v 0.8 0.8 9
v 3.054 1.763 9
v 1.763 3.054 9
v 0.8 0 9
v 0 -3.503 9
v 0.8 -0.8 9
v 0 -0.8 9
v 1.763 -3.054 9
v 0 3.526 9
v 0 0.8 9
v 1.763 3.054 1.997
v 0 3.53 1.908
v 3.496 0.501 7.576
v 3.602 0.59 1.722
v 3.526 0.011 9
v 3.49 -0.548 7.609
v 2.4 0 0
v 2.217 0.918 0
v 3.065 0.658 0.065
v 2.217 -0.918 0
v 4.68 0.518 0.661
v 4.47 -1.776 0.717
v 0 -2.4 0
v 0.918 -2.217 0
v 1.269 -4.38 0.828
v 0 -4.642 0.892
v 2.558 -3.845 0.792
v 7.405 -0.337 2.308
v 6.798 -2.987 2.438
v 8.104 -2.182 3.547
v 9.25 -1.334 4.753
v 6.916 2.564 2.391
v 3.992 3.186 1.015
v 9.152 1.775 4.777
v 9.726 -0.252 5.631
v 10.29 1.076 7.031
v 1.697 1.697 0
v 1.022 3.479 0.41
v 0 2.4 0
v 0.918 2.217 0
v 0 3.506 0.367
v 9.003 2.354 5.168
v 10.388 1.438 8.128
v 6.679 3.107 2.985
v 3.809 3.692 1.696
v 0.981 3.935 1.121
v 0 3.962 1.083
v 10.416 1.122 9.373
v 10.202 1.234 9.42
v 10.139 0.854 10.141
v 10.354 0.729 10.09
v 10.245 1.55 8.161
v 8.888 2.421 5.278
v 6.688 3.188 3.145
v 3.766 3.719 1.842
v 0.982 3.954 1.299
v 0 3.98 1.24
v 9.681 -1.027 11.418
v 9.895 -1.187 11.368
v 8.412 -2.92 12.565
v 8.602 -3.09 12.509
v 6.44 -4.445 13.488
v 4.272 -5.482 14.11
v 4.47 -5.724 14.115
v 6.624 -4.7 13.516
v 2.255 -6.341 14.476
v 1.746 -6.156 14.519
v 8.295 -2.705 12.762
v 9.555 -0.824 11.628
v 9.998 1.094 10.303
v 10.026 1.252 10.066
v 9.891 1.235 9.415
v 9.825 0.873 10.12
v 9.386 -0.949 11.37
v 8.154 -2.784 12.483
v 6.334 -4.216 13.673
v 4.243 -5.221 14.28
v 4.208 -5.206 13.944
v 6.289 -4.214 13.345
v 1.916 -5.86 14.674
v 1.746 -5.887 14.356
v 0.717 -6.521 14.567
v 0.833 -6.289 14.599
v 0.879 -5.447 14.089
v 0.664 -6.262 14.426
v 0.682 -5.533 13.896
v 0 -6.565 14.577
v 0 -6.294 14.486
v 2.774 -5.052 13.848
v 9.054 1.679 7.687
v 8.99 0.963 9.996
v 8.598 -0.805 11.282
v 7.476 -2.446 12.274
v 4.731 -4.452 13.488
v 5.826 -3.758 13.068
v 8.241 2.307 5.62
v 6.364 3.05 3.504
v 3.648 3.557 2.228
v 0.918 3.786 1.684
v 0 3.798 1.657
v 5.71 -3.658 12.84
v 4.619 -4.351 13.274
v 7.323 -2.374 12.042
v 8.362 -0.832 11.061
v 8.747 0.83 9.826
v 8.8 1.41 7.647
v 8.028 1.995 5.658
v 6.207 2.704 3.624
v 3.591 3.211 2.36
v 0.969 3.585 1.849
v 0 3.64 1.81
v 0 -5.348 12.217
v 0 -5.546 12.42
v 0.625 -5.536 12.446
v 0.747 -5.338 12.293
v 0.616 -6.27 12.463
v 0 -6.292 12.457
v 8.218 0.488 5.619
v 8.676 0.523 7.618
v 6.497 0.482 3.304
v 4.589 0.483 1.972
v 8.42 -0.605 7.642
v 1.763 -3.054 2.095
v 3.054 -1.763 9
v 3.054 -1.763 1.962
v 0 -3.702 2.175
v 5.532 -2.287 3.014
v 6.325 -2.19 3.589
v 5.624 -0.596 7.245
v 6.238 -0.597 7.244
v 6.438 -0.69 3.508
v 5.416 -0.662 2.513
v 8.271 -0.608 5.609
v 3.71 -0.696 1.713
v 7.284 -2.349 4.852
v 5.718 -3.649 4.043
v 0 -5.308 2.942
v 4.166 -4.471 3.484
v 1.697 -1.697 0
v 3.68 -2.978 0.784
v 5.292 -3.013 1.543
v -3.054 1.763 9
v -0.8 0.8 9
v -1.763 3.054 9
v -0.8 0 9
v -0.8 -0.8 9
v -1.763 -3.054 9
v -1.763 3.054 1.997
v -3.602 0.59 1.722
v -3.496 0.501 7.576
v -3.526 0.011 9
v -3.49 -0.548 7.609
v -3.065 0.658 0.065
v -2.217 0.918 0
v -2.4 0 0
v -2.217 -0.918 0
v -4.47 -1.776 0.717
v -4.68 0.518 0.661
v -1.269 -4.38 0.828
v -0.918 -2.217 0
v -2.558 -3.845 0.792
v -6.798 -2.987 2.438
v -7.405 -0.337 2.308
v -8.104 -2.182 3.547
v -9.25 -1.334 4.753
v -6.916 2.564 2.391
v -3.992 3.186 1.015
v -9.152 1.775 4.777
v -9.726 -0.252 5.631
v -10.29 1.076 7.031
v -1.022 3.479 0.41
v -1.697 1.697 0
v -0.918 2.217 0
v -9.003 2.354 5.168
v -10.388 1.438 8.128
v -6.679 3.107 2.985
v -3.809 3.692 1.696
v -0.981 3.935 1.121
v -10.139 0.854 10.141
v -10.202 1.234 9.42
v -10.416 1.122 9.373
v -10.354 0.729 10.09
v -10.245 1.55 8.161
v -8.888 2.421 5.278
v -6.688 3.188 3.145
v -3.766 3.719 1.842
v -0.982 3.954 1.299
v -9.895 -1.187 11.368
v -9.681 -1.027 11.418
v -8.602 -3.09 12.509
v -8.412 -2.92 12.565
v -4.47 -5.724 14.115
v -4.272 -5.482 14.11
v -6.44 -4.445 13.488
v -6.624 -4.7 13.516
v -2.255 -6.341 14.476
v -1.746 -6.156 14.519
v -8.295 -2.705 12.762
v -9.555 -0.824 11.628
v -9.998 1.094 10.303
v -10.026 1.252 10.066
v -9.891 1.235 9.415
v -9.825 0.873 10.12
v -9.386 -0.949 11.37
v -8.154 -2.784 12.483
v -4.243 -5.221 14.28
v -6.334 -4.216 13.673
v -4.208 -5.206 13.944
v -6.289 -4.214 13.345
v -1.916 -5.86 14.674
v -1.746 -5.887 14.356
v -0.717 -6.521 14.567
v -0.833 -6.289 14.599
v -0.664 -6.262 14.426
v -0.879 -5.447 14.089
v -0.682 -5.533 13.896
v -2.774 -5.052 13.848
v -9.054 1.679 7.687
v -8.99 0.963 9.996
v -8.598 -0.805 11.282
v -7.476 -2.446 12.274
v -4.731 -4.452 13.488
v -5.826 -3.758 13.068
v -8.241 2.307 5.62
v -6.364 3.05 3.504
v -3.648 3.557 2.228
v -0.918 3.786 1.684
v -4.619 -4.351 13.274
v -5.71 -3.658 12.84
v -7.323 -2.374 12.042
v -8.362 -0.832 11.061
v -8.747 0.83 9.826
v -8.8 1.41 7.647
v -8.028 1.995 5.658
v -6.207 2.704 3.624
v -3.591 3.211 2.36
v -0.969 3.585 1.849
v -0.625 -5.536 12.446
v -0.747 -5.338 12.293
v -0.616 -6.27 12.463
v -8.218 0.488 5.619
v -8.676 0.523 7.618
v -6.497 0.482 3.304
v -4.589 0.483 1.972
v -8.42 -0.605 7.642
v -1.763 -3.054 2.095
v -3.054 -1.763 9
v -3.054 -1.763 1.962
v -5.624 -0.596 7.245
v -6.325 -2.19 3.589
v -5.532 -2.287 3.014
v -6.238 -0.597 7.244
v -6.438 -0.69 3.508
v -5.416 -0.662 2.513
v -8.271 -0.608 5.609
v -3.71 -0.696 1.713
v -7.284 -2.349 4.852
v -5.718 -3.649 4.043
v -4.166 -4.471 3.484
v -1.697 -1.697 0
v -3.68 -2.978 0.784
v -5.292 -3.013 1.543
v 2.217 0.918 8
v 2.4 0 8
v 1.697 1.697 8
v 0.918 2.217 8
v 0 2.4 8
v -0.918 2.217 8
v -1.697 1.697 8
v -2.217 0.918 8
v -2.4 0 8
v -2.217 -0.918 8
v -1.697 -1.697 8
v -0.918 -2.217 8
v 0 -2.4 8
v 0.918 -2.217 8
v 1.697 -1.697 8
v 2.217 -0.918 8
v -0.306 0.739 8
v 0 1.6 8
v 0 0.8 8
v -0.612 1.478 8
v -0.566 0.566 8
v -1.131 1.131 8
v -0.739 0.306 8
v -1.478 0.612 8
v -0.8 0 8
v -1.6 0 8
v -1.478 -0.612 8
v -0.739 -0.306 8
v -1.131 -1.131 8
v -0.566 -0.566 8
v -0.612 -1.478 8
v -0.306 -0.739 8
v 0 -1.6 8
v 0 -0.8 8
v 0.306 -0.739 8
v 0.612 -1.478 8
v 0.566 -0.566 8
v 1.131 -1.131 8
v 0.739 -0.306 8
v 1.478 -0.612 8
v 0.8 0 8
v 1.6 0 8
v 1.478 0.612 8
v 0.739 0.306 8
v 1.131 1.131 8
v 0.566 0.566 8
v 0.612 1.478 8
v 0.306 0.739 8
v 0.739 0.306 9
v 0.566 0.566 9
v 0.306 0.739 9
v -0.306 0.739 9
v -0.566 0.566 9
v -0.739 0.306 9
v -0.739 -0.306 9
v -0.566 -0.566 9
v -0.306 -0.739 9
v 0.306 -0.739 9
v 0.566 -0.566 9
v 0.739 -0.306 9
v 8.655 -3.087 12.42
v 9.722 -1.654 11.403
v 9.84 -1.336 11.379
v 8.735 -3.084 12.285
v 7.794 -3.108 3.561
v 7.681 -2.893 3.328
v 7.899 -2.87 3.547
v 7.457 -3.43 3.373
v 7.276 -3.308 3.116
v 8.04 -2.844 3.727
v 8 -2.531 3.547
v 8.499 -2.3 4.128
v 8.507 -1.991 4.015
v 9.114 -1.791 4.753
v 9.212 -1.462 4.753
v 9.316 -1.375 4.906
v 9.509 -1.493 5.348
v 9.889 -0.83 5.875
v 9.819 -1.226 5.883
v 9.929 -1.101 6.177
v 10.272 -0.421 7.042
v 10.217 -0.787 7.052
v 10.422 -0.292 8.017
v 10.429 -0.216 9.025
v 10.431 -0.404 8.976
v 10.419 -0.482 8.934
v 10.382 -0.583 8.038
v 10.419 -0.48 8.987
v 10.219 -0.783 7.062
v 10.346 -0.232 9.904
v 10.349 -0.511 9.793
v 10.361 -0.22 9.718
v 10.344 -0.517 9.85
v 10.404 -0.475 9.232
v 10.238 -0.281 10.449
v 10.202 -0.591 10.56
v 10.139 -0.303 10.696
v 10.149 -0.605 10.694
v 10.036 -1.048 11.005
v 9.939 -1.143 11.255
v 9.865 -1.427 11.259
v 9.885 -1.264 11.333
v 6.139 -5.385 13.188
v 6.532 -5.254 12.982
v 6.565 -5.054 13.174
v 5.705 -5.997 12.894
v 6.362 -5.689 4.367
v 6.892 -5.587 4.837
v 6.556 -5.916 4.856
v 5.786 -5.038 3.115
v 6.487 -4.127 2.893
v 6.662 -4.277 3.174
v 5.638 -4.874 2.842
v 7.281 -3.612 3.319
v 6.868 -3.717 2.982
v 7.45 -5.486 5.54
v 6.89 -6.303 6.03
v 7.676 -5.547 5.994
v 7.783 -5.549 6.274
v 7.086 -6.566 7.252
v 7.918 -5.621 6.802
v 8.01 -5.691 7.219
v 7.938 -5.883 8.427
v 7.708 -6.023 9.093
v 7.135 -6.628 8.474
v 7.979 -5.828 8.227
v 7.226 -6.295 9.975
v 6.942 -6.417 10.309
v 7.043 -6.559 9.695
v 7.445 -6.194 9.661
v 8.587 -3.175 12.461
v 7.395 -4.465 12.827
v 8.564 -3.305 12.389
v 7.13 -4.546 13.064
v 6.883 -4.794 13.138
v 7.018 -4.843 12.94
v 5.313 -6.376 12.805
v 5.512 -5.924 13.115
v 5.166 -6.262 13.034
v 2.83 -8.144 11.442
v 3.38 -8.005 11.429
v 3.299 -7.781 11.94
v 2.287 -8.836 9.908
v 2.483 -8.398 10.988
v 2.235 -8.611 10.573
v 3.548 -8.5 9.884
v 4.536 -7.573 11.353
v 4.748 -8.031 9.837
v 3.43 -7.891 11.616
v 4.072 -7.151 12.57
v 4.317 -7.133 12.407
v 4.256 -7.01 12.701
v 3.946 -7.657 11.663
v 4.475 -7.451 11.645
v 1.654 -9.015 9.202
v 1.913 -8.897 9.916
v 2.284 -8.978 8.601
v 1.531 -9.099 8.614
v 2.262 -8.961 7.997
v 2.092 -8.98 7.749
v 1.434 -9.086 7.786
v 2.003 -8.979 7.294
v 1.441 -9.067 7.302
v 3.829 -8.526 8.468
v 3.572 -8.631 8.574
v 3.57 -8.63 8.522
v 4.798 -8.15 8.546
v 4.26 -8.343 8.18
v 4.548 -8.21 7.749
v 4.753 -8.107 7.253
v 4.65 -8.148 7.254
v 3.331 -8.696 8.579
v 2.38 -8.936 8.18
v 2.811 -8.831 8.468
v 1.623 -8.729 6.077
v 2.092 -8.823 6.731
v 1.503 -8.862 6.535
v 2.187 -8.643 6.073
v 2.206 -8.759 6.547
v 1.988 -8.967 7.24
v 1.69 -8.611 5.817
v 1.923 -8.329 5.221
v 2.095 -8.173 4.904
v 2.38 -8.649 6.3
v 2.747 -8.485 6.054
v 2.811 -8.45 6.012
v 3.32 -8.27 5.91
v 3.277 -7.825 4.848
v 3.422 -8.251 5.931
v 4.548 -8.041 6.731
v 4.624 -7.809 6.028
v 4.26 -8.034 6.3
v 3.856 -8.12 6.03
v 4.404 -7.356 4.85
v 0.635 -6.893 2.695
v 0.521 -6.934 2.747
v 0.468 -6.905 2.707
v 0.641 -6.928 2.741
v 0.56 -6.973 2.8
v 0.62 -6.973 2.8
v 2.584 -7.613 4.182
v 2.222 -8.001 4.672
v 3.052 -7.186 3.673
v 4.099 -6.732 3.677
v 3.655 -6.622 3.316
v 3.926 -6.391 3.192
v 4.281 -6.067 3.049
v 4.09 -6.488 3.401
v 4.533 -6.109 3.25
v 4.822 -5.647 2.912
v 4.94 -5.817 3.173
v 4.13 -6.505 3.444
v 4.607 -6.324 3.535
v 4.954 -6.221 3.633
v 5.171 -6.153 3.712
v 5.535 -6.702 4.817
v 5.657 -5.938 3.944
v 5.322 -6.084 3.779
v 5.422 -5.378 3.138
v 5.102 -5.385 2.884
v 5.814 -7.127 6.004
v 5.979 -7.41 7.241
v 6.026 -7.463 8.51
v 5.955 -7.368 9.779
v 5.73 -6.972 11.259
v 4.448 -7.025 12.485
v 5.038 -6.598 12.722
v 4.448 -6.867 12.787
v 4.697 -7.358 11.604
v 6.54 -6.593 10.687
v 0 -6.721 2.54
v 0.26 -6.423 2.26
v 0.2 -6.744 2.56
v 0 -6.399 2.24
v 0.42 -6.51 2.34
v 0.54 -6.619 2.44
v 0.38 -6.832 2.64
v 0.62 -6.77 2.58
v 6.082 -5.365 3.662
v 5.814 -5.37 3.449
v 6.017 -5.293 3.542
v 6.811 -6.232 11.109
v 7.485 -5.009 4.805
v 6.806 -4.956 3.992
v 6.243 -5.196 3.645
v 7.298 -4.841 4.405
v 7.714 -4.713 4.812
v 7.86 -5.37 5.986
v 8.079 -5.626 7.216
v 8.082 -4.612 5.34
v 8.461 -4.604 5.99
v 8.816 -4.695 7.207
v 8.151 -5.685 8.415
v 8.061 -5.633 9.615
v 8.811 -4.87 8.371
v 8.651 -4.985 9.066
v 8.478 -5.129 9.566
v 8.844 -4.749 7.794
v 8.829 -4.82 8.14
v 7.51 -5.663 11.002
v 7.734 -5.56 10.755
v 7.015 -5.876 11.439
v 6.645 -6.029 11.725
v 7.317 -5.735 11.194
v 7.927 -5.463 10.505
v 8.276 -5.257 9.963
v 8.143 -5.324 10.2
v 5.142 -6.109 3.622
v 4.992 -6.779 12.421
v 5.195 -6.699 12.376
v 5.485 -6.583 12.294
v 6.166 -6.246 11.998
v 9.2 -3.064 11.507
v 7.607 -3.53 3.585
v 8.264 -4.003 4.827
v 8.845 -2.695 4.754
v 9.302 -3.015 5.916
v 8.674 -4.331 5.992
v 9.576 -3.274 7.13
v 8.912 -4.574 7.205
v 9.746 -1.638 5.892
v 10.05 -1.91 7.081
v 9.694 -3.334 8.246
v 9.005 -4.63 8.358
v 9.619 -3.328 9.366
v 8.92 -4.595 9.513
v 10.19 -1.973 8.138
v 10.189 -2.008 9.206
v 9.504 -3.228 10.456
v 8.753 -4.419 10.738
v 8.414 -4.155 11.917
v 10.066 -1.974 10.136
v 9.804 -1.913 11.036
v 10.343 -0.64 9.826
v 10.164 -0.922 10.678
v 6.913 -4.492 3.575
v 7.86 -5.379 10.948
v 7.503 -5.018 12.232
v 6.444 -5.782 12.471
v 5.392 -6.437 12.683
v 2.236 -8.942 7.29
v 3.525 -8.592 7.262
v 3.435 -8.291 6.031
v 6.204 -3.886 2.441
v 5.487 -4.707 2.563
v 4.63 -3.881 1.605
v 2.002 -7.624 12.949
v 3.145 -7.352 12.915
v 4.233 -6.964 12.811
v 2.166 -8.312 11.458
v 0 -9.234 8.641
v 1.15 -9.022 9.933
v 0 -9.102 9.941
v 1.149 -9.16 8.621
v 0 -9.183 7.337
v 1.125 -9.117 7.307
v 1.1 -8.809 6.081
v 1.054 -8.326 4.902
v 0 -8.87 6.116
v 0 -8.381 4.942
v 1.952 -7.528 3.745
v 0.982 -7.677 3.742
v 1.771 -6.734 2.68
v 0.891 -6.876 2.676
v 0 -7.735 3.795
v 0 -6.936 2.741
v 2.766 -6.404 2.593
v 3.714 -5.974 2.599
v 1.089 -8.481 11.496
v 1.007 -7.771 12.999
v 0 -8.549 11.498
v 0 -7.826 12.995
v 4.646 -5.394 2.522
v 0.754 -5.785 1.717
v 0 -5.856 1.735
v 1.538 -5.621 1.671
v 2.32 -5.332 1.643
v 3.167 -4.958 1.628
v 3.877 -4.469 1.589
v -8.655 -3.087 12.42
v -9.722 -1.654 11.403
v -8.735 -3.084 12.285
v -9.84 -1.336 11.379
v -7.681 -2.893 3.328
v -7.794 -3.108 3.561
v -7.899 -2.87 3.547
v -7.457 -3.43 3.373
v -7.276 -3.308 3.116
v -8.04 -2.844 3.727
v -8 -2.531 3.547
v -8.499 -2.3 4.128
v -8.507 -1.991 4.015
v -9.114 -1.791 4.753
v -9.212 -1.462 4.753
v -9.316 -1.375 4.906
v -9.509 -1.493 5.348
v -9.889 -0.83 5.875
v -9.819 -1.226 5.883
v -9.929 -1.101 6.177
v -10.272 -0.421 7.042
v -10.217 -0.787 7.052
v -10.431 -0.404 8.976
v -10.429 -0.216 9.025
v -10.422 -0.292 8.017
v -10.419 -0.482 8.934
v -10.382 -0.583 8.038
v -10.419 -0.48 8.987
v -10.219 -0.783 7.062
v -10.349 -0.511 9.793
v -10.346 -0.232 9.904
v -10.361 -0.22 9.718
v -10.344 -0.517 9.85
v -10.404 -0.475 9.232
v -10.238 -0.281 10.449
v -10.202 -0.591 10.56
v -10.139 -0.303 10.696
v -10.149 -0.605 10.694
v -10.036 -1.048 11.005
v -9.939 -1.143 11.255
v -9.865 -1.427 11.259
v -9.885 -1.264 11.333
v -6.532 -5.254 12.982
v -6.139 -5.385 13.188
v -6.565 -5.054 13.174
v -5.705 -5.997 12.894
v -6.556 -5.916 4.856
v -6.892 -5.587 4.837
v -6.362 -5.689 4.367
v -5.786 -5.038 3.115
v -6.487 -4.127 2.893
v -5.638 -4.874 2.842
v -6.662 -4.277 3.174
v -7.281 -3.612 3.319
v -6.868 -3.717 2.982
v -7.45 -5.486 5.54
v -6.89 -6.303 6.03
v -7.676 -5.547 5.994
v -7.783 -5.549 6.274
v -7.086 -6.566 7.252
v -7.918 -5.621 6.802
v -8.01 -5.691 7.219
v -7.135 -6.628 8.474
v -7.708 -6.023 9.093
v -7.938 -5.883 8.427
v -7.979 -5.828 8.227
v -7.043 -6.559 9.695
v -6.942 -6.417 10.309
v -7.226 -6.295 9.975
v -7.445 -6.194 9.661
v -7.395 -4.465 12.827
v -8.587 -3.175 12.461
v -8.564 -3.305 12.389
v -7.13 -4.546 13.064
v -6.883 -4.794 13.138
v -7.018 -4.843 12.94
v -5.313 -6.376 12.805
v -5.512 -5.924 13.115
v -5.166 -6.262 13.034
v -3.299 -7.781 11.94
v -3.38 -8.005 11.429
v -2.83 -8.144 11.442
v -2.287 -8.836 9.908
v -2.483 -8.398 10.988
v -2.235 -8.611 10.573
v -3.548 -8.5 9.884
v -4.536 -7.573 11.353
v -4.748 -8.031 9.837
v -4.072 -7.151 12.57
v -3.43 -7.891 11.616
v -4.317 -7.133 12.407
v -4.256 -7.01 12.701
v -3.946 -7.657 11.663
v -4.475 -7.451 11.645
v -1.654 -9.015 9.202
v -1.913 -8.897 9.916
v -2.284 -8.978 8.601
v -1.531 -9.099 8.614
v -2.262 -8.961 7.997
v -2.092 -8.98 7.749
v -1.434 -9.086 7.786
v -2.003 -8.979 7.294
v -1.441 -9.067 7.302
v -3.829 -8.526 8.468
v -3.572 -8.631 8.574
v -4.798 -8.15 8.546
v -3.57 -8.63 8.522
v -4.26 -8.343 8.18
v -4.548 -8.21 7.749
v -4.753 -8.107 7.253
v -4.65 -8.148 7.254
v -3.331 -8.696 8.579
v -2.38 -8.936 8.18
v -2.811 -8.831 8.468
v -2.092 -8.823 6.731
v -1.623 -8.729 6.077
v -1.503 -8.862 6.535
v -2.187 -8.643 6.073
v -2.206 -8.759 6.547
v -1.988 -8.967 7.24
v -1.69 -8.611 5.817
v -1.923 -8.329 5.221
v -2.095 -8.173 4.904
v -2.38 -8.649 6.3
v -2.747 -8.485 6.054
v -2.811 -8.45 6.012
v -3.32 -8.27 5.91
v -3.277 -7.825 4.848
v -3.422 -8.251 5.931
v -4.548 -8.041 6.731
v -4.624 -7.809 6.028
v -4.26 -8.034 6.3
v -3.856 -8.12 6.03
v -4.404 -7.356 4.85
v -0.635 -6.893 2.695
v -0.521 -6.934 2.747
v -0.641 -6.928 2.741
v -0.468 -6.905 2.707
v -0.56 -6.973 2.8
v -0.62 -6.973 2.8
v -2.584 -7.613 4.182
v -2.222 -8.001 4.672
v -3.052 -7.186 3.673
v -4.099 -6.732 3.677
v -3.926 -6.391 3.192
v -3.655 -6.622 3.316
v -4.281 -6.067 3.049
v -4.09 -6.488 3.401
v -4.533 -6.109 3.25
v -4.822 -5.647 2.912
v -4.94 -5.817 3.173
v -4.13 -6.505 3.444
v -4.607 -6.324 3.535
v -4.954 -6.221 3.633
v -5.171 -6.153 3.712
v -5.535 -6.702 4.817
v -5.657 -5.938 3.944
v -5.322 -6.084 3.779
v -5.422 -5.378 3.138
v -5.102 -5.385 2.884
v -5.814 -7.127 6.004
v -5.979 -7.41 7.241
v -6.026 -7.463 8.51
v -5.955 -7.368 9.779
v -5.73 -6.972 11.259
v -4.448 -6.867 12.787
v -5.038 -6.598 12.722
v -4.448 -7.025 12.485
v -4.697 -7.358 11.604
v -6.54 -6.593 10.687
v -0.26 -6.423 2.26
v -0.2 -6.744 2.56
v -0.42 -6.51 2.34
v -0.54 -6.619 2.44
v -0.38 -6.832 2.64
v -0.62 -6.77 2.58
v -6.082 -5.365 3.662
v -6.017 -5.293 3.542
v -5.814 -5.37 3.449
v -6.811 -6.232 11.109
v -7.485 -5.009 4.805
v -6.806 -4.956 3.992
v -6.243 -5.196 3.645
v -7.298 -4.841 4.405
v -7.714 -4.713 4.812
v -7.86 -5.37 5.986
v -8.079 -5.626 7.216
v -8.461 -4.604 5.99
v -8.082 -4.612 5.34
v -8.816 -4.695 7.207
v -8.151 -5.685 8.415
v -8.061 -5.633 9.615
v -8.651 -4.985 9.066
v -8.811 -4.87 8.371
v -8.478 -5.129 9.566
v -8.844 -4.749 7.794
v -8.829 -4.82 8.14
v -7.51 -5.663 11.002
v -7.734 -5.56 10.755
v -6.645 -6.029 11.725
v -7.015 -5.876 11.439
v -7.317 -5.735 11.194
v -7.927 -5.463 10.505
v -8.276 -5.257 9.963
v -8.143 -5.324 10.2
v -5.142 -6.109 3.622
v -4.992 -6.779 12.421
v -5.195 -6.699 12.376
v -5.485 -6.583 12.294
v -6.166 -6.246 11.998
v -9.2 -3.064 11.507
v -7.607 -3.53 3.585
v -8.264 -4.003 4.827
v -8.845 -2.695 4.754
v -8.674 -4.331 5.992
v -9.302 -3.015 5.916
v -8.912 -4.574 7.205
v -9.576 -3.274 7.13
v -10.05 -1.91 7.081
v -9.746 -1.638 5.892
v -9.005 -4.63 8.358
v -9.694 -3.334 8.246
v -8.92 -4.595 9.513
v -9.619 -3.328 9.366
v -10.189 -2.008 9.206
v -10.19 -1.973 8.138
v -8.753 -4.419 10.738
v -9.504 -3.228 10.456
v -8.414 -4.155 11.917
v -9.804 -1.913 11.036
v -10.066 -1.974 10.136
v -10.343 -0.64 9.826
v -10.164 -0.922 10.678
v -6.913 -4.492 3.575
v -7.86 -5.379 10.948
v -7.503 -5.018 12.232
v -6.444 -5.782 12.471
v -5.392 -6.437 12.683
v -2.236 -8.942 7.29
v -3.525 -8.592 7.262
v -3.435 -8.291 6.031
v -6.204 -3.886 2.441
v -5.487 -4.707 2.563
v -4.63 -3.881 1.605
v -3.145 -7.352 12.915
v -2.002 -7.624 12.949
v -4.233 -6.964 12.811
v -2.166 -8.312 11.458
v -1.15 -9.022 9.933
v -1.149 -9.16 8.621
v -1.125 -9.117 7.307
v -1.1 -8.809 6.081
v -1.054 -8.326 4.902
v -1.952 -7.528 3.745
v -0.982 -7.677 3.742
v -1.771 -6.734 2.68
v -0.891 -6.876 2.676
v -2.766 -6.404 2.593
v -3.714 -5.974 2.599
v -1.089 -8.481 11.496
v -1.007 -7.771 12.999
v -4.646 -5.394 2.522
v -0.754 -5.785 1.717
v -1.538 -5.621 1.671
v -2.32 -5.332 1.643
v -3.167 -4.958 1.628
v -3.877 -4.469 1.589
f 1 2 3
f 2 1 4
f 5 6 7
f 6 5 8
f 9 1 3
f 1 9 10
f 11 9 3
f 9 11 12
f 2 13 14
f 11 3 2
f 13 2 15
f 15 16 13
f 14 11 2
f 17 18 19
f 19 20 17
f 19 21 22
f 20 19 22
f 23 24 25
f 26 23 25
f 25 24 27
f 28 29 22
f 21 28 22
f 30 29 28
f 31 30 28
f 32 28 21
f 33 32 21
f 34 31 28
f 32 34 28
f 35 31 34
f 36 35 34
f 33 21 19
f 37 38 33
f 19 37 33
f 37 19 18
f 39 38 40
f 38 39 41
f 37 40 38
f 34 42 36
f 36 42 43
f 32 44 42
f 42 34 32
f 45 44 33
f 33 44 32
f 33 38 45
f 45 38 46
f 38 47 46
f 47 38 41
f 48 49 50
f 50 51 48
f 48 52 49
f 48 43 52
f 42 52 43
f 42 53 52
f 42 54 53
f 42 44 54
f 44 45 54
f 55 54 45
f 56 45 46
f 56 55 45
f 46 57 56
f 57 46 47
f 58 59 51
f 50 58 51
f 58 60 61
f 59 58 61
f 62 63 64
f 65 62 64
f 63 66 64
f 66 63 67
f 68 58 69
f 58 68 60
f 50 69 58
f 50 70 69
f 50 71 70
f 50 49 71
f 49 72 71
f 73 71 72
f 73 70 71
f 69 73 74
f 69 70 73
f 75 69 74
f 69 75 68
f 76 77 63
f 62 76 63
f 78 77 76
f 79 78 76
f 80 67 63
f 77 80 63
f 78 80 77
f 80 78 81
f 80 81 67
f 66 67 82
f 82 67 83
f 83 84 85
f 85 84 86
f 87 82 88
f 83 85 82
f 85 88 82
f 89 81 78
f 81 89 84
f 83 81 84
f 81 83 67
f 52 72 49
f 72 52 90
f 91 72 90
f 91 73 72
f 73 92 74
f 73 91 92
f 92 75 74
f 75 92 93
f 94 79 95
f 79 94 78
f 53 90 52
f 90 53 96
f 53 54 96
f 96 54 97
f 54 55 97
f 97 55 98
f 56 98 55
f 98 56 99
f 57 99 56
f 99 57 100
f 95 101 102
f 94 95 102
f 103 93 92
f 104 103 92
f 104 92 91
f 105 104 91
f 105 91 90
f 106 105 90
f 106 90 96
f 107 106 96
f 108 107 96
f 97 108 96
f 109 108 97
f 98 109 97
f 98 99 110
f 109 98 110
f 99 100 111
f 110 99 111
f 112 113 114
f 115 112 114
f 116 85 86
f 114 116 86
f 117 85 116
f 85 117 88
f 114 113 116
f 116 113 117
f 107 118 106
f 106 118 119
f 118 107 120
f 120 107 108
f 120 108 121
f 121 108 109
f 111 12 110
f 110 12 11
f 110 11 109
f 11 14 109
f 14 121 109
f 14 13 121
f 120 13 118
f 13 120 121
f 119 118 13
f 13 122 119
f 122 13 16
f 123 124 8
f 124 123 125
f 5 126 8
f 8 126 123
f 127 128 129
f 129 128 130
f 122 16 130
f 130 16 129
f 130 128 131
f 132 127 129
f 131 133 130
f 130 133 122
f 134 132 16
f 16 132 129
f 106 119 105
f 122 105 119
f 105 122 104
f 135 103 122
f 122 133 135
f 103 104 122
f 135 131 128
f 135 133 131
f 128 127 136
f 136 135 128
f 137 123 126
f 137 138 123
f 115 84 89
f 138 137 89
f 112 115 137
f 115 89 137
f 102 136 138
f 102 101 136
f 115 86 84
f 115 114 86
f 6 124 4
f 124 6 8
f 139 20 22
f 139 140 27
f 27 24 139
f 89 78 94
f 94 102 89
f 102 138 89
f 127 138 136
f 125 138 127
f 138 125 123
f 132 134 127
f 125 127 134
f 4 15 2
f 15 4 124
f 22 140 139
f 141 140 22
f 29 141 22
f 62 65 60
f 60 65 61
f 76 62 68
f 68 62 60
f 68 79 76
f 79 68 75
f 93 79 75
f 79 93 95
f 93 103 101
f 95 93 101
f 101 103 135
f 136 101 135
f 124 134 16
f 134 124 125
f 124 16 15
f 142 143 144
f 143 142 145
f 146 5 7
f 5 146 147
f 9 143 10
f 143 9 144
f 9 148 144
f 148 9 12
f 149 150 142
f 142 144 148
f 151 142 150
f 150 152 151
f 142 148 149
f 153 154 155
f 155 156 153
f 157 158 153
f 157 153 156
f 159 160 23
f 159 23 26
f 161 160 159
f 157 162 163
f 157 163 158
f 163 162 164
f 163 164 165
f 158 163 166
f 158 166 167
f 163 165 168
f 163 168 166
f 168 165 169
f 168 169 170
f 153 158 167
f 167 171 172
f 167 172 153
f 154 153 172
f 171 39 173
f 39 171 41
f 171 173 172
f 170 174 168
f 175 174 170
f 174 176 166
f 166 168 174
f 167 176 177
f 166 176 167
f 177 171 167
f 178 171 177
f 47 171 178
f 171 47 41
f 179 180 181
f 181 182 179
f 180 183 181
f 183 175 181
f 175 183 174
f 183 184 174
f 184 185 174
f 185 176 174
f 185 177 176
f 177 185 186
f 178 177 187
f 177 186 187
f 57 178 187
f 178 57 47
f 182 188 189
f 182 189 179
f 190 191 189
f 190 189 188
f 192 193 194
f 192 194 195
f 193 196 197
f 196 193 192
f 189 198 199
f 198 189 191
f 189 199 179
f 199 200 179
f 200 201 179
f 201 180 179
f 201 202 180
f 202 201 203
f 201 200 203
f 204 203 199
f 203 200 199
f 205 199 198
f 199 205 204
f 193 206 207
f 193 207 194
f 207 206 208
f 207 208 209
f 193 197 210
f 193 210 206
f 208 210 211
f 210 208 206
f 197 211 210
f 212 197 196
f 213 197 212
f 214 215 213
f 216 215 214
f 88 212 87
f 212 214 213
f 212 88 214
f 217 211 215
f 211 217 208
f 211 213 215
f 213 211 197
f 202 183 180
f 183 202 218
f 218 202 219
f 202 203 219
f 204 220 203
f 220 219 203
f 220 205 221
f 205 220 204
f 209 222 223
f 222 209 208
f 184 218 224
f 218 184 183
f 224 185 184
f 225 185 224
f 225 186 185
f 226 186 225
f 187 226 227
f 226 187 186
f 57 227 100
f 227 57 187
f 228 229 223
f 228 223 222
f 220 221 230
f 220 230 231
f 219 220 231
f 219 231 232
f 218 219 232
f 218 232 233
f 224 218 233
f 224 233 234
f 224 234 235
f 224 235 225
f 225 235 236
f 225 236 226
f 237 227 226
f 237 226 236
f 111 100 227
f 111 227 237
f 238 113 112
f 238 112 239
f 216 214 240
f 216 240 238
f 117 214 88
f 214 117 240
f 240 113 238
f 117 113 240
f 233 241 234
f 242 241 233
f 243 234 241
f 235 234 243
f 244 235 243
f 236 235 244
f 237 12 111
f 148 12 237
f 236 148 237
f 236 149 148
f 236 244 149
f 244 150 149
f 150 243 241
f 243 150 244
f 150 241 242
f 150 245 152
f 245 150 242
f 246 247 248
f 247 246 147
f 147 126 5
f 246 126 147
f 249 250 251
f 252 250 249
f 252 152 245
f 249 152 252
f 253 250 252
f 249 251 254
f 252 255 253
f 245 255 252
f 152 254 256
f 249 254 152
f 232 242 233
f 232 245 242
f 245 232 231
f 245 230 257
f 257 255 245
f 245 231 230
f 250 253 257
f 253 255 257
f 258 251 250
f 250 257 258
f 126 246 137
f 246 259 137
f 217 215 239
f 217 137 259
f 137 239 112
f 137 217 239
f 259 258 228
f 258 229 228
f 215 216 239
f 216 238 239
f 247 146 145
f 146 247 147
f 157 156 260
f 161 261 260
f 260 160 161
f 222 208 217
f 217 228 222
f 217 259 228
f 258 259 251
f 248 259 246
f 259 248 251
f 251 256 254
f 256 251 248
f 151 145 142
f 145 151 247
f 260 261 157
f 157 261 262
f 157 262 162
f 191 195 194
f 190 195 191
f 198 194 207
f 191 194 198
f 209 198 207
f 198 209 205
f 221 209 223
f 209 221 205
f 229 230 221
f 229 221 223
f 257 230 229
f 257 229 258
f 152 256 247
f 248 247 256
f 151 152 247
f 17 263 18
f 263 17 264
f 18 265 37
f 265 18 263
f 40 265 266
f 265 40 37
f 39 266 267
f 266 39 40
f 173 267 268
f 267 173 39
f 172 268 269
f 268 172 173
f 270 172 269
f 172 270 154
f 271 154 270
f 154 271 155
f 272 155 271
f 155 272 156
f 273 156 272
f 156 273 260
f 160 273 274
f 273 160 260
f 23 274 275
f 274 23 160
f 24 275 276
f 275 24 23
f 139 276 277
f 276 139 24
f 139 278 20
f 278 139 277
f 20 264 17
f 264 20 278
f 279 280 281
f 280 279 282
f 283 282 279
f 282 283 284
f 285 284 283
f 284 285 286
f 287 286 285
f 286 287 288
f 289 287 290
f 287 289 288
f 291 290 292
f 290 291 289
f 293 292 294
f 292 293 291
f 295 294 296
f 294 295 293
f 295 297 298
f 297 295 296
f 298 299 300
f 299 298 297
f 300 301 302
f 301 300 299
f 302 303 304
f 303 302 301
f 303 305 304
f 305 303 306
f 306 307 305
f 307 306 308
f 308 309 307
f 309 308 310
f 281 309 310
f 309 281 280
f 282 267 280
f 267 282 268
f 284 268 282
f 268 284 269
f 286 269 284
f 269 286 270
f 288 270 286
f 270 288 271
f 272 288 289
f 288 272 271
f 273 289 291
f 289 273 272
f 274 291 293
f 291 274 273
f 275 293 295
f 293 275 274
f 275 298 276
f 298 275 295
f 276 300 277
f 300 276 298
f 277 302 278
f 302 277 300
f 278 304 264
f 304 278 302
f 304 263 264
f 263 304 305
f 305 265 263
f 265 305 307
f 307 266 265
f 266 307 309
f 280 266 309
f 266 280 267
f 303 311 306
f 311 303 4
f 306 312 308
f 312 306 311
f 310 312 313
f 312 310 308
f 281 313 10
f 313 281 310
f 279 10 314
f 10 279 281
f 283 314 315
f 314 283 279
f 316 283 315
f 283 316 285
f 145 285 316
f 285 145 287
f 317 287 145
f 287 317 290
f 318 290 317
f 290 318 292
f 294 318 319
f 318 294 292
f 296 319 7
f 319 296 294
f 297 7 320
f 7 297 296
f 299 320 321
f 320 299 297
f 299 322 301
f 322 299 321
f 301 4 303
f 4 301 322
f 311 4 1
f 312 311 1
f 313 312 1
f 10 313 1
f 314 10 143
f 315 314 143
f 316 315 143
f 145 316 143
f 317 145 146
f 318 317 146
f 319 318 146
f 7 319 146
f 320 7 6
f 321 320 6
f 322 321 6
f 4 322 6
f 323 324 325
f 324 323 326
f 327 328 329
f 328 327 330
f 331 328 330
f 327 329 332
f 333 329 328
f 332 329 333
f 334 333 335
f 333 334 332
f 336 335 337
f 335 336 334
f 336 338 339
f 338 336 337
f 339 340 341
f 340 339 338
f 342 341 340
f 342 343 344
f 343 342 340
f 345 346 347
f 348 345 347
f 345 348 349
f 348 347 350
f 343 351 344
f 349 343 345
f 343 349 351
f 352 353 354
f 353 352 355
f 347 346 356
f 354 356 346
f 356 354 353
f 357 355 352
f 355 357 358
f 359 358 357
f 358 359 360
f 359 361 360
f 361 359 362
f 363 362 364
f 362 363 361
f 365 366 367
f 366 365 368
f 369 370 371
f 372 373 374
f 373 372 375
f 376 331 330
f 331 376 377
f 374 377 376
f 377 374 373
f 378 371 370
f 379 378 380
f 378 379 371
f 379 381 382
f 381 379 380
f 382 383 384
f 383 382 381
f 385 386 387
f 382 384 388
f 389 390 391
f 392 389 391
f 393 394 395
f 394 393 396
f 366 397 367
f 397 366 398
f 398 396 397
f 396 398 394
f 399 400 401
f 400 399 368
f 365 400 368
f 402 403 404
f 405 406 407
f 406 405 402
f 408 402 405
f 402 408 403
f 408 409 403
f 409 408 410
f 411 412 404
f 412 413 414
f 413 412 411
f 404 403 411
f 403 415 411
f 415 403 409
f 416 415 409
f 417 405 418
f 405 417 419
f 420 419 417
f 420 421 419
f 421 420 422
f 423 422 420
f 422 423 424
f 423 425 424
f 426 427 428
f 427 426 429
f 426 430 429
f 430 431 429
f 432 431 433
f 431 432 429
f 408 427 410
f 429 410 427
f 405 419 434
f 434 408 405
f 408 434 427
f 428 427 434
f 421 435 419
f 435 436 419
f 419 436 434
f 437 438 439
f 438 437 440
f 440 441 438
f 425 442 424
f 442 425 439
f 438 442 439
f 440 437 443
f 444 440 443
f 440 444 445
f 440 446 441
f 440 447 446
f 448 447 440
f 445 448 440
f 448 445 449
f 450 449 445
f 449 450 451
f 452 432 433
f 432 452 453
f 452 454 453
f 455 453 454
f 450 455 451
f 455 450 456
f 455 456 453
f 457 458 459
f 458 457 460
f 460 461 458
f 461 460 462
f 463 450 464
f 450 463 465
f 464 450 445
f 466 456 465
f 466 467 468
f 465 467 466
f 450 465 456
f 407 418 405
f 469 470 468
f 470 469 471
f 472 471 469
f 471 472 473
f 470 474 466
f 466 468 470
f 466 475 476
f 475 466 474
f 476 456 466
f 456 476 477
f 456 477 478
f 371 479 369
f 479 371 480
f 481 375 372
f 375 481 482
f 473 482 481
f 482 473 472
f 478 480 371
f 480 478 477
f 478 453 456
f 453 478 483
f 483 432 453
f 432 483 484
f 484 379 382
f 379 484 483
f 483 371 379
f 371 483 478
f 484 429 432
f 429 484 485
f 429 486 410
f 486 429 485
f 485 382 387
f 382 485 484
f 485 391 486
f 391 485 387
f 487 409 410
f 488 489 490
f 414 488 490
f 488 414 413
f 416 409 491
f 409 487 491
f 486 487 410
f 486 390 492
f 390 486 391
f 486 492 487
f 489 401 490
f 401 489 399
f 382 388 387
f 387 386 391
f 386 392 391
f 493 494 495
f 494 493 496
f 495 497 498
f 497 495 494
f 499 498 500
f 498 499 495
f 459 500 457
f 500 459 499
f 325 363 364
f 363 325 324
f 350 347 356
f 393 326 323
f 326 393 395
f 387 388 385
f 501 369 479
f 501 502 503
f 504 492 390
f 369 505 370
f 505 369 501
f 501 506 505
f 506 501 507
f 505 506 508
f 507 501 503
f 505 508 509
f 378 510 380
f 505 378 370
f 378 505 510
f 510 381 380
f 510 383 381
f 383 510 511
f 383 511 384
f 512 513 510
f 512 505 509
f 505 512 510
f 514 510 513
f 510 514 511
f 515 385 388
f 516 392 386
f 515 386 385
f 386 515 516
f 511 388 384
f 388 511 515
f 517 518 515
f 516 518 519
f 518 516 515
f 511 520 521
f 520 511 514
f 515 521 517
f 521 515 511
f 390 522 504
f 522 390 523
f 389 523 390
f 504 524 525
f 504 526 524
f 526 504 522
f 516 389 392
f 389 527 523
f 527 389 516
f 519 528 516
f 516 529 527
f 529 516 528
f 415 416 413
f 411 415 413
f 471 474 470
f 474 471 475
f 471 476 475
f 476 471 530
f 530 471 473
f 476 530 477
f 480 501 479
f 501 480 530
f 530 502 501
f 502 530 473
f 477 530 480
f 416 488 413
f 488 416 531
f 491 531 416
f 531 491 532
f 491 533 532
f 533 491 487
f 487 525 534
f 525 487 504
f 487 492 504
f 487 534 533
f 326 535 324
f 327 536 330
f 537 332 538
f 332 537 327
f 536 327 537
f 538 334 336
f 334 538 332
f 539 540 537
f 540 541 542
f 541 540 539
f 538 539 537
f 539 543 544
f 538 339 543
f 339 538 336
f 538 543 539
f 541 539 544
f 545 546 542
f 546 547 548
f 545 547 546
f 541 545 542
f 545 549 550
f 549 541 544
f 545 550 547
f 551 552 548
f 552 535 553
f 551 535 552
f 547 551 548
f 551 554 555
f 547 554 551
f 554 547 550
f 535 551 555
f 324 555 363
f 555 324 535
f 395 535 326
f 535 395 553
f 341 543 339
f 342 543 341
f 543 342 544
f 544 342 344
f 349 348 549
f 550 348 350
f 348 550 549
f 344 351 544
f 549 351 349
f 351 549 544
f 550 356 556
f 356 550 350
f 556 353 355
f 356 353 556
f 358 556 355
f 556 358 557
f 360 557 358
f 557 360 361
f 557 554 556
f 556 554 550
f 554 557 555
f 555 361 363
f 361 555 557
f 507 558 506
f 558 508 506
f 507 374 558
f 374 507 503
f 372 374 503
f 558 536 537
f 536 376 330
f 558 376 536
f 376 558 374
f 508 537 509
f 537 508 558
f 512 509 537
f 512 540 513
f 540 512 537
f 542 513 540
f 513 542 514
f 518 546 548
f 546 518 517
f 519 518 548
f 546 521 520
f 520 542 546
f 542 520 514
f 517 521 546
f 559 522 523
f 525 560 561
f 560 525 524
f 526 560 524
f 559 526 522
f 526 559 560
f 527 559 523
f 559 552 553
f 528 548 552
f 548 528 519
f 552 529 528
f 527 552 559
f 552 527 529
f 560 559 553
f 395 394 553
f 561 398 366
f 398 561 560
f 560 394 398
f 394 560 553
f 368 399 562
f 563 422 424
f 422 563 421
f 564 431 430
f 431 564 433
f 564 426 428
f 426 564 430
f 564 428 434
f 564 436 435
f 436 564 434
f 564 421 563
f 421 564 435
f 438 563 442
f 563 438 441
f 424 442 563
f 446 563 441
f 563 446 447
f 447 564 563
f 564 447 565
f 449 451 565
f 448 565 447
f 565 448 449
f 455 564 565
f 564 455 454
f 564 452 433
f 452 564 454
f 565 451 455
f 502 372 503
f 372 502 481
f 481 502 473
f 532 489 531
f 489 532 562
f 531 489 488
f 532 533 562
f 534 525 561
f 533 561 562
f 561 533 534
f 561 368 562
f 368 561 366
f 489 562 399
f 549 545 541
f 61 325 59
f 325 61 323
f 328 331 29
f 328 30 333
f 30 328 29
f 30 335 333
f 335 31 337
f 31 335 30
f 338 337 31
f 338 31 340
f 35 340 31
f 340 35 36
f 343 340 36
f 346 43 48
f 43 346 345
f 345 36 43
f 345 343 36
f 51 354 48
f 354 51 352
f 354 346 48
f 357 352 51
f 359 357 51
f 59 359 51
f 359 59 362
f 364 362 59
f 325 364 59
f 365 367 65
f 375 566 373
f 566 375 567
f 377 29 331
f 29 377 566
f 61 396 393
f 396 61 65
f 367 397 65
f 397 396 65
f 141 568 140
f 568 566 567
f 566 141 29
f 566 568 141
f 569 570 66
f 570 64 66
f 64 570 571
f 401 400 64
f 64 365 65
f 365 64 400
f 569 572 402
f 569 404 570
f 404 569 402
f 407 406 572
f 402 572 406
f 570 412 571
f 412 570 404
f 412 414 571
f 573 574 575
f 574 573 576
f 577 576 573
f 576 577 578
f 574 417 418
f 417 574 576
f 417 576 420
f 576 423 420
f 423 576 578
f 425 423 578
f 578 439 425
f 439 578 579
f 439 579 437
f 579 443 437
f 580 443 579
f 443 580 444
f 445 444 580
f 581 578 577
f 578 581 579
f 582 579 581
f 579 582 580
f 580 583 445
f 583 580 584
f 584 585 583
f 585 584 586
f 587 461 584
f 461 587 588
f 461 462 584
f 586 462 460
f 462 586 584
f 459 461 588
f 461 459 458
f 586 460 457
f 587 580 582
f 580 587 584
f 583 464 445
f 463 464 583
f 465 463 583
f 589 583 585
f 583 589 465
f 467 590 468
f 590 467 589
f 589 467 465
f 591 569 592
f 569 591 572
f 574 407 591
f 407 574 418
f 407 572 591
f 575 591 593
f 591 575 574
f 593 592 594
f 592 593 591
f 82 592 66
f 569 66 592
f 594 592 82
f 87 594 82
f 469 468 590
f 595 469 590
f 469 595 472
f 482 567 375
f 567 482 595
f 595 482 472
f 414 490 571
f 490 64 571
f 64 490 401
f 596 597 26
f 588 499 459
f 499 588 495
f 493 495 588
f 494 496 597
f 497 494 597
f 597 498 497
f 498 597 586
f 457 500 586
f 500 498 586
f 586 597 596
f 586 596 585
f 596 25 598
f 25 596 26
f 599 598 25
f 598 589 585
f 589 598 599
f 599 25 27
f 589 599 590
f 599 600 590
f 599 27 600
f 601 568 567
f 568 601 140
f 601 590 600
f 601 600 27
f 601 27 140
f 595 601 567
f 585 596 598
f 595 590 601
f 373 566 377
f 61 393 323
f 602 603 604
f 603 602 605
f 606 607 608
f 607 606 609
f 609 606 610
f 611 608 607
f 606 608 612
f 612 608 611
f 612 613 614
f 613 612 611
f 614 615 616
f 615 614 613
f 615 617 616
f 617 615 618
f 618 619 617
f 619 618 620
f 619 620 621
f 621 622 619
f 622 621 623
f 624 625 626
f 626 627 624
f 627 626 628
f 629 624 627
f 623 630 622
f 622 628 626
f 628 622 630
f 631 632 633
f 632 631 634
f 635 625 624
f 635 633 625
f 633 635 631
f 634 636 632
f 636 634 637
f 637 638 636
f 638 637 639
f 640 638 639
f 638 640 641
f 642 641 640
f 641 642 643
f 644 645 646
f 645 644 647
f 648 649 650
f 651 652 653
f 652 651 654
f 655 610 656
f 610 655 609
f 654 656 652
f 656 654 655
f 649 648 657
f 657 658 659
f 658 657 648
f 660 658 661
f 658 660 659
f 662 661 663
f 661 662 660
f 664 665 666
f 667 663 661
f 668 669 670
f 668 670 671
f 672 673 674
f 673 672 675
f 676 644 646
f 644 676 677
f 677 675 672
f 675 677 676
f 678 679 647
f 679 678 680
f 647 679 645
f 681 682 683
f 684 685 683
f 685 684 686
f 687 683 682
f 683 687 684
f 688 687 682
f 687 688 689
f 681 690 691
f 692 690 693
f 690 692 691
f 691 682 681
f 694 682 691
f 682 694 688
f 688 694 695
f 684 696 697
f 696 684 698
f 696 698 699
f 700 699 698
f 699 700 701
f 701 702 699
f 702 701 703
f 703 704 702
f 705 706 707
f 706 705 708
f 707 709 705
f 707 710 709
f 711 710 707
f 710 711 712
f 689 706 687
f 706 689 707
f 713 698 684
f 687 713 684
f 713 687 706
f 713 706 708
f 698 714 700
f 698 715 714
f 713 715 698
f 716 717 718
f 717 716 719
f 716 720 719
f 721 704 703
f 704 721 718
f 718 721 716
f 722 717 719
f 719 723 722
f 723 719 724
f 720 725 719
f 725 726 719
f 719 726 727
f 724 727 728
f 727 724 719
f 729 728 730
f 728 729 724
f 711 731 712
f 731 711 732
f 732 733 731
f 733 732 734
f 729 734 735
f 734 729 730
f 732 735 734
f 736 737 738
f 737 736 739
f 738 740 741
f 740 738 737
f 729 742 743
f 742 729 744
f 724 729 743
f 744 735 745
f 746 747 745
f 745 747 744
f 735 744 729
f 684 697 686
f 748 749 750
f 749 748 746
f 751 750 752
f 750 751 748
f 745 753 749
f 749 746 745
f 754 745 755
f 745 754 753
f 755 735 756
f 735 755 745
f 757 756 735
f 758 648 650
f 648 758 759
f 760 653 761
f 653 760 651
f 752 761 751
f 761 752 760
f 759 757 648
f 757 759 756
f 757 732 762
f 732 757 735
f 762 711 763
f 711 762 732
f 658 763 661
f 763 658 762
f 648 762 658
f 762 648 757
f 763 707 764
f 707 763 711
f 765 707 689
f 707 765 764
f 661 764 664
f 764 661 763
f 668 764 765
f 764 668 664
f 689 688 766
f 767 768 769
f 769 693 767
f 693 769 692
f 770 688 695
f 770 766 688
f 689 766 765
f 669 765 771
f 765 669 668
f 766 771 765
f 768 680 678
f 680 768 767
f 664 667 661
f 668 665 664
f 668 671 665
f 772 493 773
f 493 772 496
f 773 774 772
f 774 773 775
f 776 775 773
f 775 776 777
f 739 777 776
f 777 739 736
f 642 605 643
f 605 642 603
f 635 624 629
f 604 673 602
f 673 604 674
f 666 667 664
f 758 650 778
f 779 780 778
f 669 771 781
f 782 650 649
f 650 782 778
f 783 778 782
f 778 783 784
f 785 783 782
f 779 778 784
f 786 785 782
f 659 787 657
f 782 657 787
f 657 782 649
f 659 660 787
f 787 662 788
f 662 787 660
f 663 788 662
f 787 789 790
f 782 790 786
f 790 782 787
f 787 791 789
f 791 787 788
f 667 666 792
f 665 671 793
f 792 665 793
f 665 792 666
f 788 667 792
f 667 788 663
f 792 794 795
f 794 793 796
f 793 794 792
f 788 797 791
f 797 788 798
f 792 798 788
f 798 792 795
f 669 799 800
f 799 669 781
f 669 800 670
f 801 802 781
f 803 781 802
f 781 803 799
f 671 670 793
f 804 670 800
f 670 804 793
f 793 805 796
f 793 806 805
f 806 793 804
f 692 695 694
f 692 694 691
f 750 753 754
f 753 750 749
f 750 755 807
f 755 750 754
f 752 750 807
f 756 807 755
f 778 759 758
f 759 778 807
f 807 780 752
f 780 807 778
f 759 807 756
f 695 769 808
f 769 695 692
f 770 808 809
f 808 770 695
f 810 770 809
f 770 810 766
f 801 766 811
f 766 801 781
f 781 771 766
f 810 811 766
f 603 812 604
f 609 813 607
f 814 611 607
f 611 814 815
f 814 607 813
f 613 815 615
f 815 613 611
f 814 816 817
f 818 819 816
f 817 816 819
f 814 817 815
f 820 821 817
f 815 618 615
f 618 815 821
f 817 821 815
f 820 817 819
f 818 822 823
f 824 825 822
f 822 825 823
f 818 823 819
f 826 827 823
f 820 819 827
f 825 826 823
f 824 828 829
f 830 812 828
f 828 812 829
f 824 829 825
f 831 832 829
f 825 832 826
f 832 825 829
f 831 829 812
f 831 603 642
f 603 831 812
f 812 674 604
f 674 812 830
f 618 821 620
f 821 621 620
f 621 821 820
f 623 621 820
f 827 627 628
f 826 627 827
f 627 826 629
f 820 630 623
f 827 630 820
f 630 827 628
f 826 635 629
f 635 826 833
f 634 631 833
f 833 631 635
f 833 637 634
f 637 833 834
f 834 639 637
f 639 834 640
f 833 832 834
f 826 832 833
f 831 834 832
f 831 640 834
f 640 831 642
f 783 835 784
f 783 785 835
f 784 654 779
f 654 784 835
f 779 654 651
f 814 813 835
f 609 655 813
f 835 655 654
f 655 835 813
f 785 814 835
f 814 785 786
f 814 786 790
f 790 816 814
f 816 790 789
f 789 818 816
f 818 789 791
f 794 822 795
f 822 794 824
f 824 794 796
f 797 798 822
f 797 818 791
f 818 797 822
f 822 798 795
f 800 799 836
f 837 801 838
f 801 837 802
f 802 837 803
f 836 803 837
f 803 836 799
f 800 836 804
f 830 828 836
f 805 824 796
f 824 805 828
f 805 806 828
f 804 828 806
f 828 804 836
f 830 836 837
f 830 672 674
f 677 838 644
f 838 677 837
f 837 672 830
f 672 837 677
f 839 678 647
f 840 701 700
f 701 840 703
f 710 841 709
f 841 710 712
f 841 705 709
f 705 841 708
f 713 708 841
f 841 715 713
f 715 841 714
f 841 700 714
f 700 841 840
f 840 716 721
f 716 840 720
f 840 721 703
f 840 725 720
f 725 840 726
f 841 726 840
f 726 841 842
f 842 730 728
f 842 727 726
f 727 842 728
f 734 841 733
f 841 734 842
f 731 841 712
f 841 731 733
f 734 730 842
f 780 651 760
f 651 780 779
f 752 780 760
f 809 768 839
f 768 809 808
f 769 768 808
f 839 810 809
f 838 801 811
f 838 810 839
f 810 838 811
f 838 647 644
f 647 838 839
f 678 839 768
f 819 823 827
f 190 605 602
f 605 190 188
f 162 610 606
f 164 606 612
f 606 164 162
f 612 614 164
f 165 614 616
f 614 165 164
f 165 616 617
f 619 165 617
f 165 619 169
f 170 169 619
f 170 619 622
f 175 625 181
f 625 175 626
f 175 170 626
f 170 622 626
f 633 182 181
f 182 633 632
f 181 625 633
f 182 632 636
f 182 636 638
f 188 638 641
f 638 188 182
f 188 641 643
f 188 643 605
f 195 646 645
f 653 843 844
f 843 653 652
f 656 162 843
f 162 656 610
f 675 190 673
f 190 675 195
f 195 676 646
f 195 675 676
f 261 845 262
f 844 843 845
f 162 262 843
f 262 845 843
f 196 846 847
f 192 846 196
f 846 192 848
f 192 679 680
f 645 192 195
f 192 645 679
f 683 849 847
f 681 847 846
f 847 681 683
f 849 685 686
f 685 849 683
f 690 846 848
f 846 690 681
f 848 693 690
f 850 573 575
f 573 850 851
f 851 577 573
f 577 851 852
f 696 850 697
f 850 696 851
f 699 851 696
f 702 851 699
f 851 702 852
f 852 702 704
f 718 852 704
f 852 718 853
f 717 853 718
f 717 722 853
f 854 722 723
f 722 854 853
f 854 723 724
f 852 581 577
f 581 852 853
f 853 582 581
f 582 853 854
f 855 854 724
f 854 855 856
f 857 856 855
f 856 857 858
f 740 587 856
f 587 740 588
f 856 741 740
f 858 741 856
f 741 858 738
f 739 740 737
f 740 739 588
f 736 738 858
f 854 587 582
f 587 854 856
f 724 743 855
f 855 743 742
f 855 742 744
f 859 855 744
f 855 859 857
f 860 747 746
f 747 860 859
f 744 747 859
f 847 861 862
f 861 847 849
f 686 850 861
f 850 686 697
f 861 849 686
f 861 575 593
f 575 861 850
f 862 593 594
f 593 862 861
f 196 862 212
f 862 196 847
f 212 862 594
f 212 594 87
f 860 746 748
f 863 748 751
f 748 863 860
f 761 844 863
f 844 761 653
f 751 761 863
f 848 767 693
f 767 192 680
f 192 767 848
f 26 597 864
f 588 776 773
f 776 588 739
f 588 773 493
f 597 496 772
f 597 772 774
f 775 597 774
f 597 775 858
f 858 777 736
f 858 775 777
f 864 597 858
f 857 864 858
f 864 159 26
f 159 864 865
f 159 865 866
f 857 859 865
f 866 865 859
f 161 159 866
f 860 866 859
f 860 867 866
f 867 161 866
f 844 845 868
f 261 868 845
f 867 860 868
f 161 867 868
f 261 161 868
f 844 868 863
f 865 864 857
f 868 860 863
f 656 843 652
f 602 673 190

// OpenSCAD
use <../lib.scad>
use <s/31512p01s01.scad>
use <s/31512s01.scad>
use <s/31512s04.scad>
function ldraw_lib__31512p01() = [
// 0 ~Minifig Head Powerpuff Girls Face with Blossom Pattern
// 0 Name: 31512p01.dat
// 0 Author: Magnus Forsberg [MagFors]
// 0 !LDRAW_ORG Part UPDATE 2023-05
// 0 !LICENSE Licensed under CC BY 4.0 : see CAreadme.txt
// 
// 0 BFC CERTIFY CCW
  [0,"BFC","CERTIFY"],
  [0,"BFC","CCW"],
// 
// 0 !KEYWORDS set 41288
// 
// 0 !HISTORY 2023-10-31 [OrionP] Official Update 2023-05
// 
// 
// 1 16 0 0 0 1 0 0 0 1 0 0 0 1 s\31512s01.dat
  [1,16,0,0,0,1,0,0,0,1,0,0,0,1, ldraw_lib__s__31512s01()],
// 1 16 0 0 0 1 0 0 0 1 0 0 0 1 s\31512p01s01.dat
  [1,16,0,0,0,1,0,0,0,1,0,0,0,1, ldraw_lib__s__31512p01s01()],
// 1 16 0 0 0 -1 0 0 0 1 0 0 0 1 s\31512p01s01.dat
  [1,16,0,0,0,-1,0,0,0,1,0,0,0,1, ldraw_lib__s__31512p01s01()],
// 1 16 0 0 0 1 0 0 0 1 0 0 0 1 s\31512s04.dat
  [1,16,0,0,0,1,0,0,0,1,0,0,0,1, ldraw_lib__s__31512s04()],
// 1 16 0 0 0 -1 0 0 0 1 0 0 0 1 s\31512s04.dat
  [1,16,0,0,0,-1,0,0,0,1,0,0,0,1, ldraw_lib__s__31512s04()],
];
module ldraw_lib__31512p01(step=0, col=false, unit=2/5, alt=false, line=0.2, solid=!$preview)
    makepoly(ldraw_lib__31512p01(), step=step, col=col, unit=unit, alt=alt, line=line, solid=solid);
ldraw_lib__31512p01(line=0.2);
